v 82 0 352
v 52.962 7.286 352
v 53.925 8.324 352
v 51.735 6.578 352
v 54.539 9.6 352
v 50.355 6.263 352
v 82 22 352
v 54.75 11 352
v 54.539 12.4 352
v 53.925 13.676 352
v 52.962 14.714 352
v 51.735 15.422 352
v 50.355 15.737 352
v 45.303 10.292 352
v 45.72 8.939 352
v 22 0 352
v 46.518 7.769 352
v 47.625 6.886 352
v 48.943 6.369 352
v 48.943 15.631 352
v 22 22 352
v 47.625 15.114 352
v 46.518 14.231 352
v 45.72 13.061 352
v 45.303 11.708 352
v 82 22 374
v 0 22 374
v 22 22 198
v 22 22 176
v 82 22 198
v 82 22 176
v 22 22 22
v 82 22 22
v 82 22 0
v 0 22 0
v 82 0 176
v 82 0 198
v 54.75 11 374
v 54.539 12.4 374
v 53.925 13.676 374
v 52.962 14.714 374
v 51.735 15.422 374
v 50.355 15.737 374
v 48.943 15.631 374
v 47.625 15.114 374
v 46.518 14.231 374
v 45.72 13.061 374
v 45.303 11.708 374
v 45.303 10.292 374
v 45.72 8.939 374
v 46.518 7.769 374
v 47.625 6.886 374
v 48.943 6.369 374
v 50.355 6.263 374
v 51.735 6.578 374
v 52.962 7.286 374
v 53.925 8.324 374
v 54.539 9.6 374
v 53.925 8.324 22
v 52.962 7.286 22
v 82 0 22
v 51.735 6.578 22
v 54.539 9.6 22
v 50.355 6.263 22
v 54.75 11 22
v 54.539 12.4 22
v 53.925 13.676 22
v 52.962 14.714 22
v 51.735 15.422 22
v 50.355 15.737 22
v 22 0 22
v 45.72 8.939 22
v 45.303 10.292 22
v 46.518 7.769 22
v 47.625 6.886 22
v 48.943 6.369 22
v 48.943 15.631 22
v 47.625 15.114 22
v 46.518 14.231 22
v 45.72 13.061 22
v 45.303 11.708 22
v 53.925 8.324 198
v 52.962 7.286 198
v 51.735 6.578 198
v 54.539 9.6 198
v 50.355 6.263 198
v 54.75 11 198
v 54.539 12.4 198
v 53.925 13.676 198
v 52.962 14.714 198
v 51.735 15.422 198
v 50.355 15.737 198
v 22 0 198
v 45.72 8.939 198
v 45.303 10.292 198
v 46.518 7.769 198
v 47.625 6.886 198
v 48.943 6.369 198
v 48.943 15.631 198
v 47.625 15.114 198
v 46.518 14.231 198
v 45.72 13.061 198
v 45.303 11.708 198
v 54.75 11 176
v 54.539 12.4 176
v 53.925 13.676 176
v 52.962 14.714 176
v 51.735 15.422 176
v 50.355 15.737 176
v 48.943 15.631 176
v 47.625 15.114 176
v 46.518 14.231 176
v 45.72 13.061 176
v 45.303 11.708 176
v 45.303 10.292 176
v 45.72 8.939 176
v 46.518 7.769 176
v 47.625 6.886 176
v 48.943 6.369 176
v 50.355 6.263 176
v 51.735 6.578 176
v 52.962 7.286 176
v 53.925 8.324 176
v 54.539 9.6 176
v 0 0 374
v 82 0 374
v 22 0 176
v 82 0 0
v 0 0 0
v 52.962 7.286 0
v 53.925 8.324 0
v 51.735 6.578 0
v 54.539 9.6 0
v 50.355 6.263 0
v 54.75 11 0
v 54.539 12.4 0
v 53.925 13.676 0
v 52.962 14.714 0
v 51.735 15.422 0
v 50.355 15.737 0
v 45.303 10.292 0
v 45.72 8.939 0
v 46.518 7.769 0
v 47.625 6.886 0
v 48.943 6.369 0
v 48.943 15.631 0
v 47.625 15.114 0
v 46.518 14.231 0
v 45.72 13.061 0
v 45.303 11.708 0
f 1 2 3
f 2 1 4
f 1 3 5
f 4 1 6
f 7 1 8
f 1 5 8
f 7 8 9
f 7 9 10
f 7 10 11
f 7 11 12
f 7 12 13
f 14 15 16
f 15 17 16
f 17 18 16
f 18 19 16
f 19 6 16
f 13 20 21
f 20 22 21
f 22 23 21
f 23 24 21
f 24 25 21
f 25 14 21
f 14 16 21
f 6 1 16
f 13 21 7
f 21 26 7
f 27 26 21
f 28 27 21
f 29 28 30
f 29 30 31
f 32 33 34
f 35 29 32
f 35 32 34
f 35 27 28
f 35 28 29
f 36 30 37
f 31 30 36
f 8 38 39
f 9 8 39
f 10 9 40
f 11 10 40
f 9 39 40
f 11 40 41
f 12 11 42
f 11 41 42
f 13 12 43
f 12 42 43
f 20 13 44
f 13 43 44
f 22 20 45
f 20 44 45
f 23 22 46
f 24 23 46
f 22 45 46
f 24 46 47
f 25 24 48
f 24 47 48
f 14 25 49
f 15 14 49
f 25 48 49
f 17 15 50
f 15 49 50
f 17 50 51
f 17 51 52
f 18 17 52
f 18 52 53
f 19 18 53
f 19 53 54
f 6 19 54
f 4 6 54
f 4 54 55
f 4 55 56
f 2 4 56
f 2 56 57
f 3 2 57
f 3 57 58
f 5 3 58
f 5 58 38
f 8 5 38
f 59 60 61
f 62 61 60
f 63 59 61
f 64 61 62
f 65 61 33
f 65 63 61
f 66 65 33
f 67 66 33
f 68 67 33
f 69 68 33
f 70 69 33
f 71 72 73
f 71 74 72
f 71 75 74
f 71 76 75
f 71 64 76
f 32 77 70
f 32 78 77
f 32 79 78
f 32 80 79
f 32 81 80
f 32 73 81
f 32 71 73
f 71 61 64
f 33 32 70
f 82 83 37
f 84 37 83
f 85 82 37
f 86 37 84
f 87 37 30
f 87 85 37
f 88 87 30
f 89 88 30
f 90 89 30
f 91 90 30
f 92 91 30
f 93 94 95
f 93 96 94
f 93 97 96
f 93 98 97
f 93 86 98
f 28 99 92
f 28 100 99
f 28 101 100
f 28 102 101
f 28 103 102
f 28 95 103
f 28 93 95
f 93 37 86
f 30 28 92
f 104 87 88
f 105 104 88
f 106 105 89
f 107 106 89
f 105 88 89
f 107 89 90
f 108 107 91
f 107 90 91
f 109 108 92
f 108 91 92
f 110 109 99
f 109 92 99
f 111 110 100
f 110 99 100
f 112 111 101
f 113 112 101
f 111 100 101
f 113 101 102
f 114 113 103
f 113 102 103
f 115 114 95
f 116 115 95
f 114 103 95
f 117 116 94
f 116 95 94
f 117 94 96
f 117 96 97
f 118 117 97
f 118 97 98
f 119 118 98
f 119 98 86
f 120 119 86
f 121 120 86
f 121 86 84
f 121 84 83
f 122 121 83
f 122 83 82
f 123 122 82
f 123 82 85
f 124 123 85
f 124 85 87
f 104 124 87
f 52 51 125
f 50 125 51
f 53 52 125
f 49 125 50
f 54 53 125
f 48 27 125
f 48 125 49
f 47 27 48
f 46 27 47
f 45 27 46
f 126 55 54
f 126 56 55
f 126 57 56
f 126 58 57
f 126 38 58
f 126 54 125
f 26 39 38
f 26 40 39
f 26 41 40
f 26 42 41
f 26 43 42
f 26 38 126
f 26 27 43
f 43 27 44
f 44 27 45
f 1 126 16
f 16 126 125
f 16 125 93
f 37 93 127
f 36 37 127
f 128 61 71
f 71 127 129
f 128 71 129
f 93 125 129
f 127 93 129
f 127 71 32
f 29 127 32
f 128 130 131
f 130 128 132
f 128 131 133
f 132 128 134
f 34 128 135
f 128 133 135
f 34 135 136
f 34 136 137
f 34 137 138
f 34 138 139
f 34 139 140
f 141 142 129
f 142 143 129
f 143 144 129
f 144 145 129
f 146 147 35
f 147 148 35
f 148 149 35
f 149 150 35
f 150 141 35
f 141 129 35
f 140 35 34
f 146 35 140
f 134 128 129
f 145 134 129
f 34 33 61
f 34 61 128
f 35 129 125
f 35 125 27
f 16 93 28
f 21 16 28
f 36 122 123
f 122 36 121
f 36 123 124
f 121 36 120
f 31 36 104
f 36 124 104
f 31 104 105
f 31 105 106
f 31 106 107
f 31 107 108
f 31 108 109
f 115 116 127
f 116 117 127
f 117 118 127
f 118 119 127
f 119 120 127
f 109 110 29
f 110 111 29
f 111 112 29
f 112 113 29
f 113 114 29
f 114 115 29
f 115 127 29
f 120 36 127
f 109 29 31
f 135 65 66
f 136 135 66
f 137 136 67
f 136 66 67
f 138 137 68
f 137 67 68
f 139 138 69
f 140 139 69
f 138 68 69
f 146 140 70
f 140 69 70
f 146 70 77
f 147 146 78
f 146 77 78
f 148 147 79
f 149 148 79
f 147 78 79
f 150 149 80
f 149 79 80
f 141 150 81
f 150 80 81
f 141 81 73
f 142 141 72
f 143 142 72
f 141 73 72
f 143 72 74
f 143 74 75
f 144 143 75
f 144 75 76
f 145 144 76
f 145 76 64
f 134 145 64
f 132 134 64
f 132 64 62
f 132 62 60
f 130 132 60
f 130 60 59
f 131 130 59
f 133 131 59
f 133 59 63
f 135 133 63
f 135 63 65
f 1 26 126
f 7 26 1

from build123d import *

# Parameters (mm, degrees)
ESQUISSE1_W      = 22
ESQUISSE1_H      = 22
EXTRUSION1_DEPTH = 374
ESQUISSE2_W      = 22
ESQUISSE2_H      = 22
EXTRUSION2_DEPTH = 60
ESQUISSE3_R      = 4.75
EXTRUSION3_DEPTH = 374


with BuildPart() as part:
    # Esquisse1 → Extrusion1 (new body)
    with BuildSketch(Plane.XY):
        with Locations((11, 11)):
            Rectangle(ESQUISSE1_W, ESQUISSE1_H)
    extrude(amount=EXTRUSION1_DEPTH)

    # Esquisse2 → Extrusion2 (add)
    with BuildSketch(Plane(origin=(22, 0, 0), x_dir=(0, 0, -1), z_dir=(1, 0, 0))):
        with Locations((-11, 11)):
            Rectangle(ESQUISSE2_W, ESQUISSE2_H)
        with Locations((-363, 11)):
            Rectangle(ESQUISSE2_W, ESQUISSE2_H)
        with Locations((-187, 11)):
            Rectangle(ESQUISSE2_W, ESQUISSE2_H)
    extrude(amount=EXTRUSION2_DEPTH)

    # Esquisse3 → Extrusion3 (cut)
    with BuildSketch(Plane.XY.offset(374)):
        with Locations((50, 11)):
            Circle(ESQUISSE3_R)
    extrude(amount=-EXTRUSION3_DEPTH, mode=Mode.SUBTRACT)


solid = part.part
